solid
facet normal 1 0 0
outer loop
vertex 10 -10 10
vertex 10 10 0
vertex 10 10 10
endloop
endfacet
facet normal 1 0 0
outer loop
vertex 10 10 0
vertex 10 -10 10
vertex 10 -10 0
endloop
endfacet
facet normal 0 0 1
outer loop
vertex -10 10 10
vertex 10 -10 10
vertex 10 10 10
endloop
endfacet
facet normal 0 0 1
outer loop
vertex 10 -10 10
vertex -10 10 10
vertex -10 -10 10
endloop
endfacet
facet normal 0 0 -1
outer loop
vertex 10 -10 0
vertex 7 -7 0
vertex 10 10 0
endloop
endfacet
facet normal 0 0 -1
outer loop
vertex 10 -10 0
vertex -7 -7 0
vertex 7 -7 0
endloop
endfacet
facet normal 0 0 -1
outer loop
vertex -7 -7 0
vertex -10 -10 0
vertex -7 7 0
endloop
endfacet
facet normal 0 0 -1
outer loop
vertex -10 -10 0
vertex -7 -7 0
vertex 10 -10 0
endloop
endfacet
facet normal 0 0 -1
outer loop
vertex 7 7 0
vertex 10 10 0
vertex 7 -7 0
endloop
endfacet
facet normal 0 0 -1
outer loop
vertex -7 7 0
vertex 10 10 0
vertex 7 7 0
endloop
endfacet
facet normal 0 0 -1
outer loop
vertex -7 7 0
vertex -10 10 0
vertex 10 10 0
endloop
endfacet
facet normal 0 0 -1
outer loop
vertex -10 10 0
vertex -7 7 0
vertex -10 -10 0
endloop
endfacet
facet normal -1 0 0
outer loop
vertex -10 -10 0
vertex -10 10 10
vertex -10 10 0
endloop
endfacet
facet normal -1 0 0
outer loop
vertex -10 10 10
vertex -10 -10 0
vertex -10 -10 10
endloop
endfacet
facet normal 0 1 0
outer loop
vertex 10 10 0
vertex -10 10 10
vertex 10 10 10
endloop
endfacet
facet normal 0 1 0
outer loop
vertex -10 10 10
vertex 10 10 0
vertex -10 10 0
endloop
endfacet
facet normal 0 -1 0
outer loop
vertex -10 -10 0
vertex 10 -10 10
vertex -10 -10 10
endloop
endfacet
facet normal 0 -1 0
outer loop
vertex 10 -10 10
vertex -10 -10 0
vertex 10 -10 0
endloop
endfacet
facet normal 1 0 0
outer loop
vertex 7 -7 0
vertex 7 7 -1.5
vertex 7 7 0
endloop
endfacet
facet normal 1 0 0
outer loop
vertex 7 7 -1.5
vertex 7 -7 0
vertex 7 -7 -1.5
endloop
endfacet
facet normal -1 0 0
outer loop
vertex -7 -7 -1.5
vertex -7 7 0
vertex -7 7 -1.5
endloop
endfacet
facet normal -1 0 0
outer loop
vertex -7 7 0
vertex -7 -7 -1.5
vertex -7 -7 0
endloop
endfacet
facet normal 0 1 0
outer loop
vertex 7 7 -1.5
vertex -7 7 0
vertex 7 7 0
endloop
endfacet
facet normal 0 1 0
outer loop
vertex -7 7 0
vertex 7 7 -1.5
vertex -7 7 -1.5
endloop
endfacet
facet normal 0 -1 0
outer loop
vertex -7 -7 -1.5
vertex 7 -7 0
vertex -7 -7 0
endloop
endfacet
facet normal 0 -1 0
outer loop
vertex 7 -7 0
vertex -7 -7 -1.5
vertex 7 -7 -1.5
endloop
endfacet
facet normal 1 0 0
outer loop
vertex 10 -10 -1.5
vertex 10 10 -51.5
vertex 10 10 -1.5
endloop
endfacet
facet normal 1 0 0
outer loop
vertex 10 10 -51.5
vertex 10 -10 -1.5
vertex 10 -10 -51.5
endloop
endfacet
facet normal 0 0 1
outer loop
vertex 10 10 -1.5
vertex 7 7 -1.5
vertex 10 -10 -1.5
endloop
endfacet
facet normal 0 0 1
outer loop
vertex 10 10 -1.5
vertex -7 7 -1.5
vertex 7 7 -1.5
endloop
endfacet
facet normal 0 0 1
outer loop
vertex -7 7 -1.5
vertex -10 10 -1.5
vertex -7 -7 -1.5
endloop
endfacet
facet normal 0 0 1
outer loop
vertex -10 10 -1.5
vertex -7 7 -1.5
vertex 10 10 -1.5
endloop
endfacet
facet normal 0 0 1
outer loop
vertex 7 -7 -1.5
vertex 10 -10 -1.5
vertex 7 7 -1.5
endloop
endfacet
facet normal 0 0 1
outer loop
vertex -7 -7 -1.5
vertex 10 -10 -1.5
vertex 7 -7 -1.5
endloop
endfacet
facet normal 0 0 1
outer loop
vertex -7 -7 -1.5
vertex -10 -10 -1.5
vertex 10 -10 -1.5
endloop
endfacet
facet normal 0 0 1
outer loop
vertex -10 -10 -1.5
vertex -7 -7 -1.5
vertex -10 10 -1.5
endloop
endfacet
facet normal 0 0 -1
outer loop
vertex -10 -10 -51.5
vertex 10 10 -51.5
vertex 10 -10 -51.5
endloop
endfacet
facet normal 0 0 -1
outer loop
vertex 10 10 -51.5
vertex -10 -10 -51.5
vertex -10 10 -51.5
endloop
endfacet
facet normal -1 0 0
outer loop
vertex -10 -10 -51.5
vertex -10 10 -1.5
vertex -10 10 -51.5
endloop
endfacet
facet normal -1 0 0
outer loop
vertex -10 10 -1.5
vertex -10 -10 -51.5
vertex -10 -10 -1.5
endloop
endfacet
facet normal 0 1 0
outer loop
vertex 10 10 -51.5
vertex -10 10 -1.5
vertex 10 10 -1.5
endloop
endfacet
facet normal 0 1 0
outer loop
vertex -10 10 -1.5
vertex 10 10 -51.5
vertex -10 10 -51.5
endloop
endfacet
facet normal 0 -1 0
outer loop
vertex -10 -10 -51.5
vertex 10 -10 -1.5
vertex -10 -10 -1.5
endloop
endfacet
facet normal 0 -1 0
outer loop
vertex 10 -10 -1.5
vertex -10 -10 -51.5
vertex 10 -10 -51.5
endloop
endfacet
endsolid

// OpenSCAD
// Generated by SolidPython 1.1.3 on 2024-12-14 22:48:25


union() {
	translate(v = [-10, -10, 0]) {
		cube(size = [20, 20, 10]);
	}
	translate(v = [-7, -7, -49]) {
		cube(size = [14, 14, 50]);
	}
	translate(v = [-10, -10, -51.5000000000]) {
		cube(size = [20, 20, 50]);
	}
}
/***********************************************
*********      SolidPython code:      **********
************************************************
 
from solid import *

# ケースからカットする部分
hole = union()(
    # スイッチの上側をカットする部分
    translate([-10, -10, 0])(
        cube([20, 20, 10])
    ),
    # スイッチの穴
    translate([-7, -7, -49])(
        cube([14, 14, 50])
    ),
    # スイッチプレートの下側
    translate([-10, -10, -51.5])(
        cube([20, 20, 50])
    ),
)

scad_render_to_file(hole, '2_hole.scad')
 
 
************************************************/
